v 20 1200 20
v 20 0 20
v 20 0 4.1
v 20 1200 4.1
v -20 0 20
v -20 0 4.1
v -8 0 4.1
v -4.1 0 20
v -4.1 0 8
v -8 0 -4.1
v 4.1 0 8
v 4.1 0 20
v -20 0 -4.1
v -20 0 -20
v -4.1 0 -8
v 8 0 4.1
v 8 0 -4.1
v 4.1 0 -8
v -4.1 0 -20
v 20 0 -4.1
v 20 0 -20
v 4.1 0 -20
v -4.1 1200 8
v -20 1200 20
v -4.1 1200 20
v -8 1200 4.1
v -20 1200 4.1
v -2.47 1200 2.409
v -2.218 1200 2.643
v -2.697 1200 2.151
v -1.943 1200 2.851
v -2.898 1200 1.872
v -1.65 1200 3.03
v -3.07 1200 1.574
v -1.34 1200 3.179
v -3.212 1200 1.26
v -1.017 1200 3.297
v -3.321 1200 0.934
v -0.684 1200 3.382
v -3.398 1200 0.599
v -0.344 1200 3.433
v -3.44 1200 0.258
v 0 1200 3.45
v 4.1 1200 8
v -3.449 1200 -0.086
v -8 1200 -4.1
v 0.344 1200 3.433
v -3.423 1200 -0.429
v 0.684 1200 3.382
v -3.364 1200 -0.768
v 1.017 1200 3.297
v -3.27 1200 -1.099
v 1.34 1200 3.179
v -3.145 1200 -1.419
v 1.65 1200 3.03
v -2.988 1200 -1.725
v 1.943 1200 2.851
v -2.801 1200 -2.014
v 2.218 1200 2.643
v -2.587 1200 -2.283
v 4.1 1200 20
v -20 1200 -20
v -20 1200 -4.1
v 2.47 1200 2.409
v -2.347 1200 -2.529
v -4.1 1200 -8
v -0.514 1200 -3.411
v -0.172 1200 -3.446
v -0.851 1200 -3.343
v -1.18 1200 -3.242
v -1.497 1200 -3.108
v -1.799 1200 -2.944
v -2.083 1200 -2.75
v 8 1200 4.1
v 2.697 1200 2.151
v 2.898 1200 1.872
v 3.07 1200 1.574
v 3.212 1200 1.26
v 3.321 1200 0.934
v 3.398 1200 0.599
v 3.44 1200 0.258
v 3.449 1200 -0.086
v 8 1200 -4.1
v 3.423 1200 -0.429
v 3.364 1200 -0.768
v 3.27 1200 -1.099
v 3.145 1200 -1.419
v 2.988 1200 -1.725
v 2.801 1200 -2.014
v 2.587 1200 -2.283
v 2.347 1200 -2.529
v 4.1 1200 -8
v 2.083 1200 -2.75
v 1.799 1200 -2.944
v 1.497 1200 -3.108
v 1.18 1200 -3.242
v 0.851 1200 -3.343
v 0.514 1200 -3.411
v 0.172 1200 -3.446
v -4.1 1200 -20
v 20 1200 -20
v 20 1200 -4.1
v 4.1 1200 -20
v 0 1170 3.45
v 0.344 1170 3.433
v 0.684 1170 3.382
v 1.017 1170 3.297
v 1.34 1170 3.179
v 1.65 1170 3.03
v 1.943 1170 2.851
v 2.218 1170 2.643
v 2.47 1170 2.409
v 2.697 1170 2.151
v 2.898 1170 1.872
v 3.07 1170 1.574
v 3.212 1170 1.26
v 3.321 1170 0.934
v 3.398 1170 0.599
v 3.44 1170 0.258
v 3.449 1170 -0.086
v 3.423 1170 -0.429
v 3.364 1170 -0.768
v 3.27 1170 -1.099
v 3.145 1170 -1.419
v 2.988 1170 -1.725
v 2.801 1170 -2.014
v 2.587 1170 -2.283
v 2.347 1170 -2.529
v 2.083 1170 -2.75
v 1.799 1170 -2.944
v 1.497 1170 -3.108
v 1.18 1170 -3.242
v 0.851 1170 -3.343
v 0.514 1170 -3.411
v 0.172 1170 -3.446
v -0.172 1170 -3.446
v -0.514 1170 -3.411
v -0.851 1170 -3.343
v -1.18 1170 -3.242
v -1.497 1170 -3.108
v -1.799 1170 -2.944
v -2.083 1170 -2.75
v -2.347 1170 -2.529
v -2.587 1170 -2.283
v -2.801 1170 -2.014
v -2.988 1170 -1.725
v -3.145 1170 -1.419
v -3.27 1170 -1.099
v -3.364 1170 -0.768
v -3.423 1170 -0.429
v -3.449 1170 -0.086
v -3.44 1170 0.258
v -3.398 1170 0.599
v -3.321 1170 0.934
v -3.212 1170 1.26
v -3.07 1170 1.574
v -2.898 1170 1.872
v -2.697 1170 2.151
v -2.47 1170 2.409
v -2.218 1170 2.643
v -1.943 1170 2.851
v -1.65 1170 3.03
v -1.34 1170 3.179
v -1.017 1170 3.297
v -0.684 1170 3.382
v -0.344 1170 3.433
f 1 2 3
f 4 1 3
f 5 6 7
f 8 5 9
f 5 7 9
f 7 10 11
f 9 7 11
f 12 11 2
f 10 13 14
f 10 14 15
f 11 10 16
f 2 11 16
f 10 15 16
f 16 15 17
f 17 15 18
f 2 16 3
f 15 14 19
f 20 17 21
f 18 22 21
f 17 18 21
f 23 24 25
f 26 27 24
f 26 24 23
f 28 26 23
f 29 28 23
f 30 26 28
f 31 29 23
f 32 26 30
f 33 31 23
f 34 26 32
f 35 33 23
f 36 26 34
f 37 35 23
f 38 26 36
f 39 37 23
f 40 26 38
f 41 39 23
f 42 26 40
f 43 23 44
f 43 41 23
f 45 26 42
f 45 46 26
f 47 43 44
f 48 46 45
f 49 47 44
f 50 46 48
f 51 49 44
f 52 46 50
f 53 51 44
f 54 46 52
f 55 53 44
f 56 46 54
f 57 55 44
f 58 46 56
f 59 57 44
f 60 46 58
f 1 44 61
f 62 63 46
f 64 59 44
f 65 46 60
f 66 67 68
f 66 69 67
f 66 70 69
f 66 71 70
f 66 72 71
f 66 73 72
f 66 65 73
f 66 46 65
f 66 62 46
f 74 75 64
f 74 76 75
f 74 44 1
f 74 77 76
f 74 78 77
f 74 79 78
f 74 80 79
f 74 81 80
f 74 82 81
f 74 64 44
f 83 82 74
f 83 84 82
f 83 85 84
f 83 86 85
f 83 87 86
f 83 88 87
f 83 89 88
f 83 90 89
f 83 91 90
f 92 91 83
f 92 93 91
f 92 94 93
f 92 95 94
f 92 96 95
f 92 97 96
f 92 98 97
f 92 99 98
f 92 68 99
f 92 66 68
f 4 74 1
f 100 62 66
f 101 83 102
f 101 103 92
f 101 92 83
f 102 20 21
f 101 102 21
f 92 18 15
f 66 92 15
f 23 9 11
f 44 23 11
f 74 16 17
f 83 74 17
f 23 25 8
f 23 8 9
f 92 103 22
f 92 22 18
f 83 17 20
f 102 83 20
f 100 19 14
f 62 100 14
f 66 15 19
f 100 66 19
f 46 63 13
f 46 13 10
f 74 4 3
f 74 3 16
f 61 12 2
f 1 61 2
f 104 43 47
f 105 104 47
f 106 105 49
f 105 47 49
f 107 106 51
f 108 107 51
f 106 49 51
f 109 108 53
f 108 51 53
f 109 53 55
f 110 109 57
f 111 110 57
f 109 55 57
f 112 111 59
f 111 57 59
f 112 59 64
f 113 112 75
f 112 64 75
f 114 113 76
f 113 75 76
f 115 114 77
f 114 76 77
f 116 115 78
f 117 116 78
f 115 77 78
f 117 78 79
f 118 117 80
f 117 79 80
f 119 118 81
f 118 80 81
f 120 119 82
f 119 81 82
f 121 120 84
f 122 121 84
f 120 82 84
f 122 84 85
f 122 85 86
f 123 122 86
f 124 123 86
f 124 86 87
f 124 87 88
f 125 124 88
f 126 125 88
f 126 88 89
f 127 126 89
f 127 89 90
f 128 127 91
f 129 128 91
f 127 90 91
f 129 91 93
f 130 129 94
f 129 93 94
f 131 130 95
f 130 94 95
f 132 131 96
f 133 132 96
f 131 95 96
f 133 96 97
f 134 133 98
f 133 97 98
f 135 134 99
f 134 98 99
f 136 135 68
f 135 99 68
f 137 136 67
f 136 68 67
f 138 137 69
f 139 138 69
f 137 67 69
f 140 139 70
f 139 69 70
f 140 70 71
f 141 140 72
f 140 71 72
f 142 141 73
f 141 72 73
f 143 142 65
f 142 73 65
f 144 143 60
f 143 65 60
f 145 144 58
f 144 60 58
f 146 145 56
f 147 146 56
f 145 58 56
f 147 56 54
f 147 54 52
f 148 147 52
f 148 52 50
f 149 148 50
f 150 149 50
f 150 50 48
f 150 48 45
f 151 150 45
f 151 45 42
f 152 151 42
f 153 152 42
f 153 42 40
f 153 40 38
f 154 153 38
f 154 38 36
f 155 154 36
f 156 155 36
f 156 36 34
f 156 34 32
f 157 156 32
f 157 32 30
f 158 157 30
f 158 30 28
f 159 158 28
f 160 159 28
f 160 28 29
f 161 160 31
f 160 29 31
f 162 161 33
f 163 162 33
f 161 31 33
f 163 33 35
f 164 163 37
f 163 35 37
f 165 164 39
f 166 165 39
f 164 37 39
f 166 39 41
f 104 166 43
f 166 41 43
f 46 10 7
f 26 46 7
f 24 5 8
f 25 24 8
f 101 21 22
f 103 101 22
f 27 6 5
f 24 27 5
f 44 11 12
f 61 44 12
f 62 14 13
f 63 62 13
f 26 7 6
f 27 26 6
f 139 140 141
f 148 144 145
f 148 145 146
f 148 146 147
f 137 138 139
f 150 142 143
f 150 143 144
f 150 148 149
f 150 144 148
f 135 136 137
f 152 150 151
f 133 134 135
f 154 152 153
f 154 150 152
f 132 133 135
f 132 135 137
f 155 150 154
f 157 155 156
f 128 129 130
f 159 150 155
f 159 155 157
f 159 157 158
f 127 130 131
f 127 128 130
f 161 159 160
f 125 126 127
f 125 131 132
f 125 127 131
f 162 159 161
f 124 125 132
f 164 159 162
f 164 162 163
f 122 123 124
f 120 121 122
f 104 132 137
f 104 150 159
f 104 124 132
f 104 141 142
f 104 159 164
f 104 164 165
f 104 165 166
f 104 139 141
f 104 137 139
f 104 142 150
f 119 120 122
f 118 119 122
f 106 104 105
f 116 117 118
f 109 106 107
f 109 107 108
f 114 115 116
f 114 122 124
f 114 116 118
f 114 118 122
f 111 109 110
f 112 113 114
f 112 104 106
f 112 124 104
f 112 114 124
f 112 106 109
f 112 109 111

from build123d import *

# Parameters (mm, degrees)
AUFSATZ_LINEAR_AUSTRAGEN1_DEPTH = 1200
SKIZZE2_R                       = 3.45
SCHNITT_LINEAR_AUSTRAGEN1_DEPTH = 30


with BuildPart() as part:
    # Skizze1 → Aufsatz-Linear austragen1 (new body)
    with BuildSketch(Plane(origin=(0, 0, 0), x_dir=(1, 0, 0), z_dir=(0, 1, 0))):
        Polygon((-4.1, -20), (-4.1, -8), (4.1, -8), (4.1, -20), (20, -20), (20, -4.1), (8, -4.1), (8, 4.1), (20, 4.1), (20, 20), (4.1, 20), (4.1, 8), (-4.1, 8), (-4.1, 20), (-20, 20), (-20, 4.1), (-8, 4.1), (-8, -4.1), (-20, -4.1), (-20, -20), align=None)
    extrude(amount=AUFSATZ_LINEAR_AUSTRAGEN1_DEPTH)

    # Skizze2 → Schnitt-Linear austragen1 (cut)
    with BuildSketch(Plane(origin=(0, 1200, 0), x_dir=(1, 0, 0), z_dir=(0, 1, 0))):
        with Locations(Location((0, 0, 0), (0, 0, 270))):
            Circle(SKIZZE2_R)
    extrude(amount=-SCHNITT_LINEAR_AUSTRAGEN1_DEPTH, mode=Mode.SUBTRACT)


solid = part.part
